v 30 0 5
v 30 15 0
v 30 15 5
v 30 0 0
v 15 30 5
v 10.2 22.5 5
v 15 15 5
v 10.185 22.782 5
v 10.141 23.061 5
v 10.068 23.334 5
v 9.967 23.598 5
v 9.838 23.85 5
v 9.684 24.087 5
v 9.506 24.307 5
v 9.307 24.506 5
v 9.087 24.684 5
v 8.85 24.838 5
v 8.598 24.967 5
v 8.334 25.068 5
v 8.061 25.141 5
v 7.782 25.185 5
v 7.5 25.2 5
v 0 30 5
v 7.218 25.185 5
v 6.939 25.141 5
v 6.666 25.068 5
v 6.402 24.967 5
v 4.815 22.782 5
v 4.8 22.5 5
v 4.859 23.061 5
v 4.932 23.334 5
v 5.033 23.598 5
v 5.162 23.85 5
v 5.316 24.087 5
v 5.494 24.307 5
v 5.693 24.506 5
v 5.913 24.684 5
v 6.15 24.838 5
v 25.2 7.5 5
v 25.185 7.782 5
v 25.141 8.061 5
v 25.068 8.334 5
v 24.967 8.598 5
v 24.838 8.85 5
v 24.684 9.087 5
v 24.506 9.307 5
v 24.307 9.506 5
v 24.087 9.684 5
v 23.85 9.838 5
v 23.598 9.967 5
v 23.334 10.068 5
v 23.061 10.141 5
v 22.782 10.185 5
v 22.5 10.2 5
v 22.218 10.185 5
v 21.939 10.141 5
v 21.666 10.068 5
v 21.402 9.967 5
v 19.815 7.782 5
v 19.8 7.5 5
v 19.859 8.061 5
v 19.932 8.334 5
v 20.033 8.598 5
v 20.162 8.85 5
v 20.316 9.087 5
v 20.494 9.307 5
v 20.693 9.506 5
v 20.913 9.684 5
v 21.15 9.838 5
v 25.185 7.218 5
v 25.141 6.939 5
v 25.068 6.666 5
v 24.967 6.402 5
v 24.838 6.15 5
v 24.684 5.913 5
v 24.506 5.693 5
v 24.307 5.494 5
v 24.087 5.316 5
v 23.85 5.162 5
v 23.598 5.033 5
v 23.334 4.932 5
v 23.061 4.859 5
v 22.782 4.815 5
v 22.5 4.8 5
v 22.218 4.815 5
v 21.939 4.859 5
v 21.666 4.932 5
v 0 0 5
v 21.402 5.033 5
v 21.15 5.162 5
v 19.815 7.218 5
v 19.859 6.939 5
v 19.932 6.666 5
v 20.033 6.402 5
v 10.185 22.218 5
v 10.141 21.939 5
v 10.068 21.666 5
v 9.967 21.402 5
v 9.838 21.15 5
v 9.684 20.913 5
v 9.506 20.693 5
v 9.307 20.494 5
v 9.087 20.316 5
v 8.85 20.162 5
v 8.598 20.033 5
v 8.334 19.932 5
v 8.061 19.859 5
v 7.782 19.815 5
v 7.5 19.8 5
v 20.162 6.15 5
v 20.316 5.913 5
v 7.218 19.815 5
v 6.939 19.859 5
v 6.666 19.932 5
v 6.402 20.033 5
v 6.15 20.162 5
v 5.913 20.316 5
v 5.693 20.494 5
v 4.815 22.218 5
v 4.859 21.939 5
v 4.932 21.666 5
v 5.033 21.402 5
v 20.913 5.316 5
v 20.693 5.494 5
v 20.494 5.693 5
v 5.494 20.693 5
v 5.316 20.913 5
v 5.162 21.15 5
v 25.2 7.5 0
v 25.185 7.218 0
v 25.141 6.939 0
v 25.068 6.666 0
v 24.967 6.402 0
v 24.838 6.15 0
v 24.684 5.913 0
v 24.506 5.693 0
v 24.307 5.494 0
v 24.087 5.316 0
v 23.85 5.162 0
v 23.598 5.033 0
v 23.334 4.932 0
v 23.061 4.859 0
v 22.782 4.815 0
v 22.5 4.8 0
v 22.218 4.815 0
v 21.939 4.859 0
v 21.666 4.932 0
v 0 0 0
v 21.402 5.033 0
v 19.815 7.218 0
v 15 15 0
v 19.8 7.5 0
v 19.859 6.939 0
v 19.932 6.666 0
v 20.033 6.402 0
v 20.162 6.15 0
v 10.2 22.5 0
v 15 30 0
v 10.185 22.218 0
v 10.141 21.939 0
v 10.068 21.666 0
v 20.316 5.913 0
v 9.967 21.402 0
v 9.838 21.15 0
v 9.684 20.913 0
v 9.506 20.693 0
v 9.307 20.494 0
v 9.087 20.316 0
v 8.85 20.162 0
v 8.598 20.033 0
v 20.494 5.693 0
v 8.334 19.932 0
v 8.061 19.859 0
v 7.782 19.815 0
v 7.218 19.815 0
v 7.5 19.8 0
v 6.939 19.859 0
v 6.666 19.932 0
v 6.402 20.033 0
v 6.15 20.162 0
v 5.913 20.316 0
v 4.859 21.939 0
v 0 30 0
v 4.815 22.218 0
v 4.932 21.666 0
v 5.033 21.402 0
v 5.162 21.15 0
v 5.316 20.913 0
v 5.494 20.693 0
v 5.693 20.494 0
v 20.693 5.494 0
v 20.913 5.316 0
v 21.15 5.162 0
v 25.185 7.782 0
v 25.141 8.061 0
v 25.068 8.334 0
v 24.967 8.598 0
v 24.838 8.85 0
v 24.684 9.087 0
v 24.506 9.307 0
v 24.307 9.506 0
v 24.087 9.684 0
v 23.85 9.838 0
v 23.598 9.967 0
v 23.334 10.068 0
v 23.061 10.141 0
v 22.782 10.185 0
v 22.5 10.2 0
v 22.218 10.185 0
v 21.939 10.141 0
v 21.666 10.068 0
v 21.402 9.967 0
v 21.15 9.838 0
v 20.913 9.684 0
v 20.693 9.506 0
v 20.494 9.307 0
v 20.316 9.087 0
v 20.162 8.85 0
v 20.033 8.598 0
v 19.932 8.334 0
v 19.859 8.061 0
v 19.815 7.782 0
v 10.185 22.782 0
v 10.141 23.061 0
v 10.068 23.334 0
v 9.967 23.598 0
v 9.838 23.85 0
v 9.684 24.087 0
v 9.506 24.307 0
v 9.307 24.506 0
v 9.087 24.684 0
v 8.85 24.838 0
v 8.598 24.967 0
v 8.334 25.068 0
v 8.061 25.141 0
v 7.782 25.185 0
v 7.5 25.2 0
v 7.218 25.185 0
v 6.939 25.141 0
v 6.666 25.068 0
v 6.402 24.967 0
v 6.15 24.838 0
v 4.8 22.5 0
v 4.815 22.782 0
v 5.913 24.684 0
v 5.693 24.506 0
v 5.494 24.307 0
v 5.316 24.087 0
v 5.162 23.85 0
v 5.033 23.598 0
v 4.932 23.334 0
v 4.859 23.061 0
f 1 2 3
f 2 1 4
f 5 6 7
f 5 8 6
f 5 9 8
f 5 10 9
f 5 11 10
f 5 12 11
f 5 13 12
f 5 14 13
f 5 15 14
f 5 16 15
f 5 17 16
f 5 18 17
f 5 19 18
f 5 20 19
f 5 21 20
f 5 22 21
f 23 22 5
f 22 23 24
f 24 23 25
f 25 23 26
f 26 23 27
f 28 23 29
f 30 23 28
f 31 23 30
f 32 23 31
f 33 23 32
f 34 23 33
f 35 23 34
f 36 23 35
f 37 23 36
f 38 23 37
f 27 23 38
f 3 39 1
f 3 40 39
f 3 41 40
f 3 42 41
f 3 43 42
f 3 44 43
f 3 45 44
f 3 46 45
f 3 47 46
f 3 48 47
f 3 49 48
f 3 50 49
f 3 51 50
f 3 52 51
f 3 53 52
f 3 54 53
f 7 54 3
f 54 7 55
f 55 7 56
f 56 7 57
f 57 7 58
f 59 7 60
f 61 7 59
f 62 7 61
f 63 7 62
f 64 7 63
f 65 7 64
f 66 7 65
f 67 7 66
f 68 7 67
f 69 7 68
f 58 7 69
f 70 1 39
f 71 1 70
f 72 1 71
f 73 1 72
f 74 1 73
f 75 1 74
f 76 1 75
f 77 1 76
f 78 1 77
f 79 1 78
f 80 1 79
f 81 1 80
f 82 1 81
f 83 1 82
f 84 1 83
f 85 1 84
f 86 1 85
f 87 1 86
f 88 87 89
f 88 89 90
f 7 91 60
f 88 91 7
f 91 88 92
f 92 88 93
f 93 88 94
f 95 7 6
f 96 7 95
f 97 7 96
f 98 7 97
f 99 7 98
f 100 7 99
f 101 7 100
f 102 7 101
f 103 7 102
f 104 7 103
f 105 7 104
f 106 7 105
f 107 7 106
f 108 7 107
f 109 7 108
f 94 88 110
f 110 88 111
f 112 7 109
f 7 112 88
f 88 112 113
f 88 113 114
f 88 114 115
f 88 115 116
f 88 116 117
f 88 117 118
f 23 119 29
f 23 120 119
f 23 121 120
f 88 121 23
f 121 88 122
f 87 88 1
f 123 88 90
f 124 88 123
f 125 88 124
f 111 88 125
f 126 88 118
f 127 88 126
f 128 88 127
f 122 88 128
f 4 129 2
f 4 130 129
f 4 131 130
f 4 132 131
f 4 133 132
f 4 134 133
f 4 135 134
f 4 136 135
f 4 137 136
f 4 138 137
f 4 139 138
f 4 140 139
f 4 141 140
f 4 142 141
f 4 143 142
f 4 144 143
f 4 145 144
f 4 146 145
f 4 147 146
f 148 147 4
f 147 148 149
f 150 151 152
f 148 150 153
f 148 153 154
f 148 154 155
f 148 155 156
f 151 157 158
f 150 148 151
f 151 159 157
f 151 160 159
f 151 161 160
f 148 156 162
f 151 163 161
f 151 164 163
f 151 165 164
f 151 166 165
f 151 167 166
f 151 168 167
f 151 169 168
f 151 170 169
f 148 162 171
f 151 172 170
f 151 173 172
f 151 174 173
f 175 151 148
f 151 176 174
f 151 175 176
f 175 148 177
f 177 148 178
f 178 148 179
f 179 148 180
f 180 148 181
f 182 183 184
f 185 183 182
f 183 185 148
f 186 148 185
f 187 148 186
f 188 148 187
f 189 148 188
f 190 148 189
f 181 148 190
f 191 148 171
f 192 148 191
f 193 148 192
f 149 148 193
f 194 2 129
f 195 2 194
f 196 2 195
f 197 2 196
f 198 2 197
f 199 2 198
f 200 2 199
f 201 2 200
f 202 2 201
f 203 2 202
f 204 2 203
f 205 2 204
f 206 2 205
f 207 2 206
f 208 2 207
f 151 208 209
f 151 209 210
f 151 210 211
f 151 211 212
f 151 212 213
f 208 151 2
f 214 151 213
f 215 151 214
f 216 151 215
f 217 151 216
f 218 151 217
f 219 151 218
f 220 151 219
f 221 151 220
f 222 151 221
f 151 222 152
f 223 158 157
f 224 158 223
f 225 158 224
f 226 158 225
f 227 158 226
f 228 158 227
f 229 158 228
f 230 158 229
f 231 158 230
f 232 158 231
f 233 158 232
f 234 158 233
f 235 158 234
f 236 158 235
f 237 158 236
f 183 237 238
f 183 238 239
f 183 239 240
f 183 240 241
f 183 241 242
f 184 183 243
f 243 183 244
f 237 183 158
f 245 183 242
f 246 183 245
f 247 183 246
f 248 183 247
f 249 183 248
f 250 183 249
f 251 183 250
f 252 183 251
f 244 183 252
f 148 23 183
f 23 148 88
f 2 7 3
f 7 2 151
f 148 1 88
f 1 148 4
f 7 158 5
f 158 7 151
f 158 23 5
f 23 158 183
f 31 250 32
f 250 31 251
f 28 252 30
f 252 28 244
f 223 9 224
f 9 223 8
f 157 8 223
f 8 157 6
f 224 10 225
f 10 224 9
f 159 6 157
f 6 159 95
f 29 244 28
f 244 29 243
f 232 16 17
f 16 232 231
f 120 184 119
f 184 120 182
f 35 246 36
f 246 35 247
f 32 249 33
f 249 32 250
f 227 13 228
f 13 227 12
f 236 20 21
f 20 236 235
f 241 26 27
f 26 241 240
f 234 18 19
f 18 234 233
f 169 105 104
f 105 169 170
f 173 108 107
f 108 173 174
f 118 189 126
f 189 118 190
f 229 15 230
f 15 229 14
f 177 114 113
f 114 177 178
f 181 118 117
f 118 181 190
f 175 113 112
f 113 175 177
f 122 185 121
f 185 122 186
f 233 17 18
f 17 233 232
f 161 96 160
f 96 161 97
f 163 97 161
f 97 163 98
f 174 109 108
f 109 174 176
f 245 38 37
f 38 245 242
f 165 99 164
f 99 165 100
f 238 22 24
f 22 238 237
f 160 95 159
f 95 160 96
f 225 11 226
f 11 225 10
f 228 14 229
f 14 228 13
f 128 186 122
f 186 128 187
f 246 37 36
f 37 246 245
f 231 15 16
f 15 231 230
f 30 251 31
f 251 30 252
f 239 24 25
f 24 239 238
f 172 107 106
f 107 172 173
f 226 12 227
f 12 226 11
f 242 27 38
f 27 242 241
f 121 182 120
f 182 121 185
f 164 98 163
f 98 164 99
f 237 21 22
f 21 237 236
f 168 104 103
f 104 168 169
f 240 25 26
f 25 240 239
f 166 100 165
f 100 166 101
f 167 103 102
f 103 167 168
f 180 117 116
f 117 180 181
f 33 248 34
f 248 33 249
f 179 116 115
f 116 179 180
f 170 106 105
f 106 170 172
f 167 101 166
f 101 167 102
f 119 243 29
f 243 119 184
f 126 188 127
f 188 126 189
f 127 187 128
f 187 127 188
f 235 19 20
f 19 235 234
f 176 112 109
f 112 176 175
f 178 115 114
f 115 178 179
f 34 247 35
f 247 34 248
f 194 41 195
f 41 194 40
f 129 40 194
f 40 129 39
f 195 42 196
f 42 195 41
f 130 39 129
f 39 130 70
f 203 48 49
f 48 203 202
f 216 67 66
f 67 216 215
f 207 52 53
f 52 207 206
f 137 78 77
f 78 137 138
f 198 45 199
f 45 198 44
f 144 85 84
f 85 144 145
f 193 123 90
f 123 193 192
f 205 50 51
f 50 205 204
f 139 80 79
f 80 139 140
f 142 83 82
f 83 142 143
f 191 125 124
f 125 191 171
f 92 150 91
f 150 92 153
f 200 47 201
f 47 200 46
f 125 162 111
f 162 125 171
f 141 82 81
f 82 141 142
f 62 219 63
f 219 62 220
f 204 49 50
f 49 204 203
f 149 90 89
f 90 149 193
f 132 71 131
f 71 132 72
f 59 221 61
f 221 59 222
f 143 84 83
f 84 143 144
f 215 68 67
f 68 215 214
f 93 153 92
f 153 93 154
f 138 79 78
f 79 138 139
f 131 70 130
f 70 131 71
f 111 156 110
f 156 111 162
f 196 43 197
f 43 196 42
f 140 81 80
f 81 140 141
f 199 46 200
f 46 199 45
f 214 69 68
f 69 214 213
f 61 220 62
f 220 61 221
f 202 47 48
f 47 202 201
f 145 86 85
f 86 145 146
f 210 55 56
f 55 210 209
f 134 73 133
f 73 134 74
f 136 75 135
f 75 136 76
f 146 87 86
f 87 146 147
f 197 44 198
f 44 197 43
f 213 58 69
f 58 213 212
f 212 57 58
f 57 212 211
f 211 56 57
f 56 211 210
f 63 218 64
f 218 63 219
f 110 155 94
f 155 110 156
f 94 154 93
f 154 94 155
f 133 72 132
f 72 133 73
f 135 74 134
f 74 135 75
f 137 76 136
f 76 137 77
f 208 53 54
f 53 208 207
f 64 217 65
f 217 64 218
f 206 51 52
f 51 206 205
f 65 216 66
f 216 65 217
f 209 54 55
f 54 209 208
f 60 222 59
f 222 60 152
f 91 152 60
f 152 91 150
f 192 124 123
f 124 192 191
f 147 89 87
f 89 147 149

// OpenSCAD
// Flat 90-degree corner plate.
$fn = 60;
eps = 0.02;
arm = 30;
width = 15;
plate_t = 5;
difference() {
    union() { cube([arm, width, plate_t]); cube([width, arm, plate_t]); }
    for (p = [[width / 2, arm - width / 2], [arm - width / 2, width / 2]])
        translate([p[0], p[1], -eps]) cylinder(d = 5.4, h = plate_t + 2 * eps);
}
